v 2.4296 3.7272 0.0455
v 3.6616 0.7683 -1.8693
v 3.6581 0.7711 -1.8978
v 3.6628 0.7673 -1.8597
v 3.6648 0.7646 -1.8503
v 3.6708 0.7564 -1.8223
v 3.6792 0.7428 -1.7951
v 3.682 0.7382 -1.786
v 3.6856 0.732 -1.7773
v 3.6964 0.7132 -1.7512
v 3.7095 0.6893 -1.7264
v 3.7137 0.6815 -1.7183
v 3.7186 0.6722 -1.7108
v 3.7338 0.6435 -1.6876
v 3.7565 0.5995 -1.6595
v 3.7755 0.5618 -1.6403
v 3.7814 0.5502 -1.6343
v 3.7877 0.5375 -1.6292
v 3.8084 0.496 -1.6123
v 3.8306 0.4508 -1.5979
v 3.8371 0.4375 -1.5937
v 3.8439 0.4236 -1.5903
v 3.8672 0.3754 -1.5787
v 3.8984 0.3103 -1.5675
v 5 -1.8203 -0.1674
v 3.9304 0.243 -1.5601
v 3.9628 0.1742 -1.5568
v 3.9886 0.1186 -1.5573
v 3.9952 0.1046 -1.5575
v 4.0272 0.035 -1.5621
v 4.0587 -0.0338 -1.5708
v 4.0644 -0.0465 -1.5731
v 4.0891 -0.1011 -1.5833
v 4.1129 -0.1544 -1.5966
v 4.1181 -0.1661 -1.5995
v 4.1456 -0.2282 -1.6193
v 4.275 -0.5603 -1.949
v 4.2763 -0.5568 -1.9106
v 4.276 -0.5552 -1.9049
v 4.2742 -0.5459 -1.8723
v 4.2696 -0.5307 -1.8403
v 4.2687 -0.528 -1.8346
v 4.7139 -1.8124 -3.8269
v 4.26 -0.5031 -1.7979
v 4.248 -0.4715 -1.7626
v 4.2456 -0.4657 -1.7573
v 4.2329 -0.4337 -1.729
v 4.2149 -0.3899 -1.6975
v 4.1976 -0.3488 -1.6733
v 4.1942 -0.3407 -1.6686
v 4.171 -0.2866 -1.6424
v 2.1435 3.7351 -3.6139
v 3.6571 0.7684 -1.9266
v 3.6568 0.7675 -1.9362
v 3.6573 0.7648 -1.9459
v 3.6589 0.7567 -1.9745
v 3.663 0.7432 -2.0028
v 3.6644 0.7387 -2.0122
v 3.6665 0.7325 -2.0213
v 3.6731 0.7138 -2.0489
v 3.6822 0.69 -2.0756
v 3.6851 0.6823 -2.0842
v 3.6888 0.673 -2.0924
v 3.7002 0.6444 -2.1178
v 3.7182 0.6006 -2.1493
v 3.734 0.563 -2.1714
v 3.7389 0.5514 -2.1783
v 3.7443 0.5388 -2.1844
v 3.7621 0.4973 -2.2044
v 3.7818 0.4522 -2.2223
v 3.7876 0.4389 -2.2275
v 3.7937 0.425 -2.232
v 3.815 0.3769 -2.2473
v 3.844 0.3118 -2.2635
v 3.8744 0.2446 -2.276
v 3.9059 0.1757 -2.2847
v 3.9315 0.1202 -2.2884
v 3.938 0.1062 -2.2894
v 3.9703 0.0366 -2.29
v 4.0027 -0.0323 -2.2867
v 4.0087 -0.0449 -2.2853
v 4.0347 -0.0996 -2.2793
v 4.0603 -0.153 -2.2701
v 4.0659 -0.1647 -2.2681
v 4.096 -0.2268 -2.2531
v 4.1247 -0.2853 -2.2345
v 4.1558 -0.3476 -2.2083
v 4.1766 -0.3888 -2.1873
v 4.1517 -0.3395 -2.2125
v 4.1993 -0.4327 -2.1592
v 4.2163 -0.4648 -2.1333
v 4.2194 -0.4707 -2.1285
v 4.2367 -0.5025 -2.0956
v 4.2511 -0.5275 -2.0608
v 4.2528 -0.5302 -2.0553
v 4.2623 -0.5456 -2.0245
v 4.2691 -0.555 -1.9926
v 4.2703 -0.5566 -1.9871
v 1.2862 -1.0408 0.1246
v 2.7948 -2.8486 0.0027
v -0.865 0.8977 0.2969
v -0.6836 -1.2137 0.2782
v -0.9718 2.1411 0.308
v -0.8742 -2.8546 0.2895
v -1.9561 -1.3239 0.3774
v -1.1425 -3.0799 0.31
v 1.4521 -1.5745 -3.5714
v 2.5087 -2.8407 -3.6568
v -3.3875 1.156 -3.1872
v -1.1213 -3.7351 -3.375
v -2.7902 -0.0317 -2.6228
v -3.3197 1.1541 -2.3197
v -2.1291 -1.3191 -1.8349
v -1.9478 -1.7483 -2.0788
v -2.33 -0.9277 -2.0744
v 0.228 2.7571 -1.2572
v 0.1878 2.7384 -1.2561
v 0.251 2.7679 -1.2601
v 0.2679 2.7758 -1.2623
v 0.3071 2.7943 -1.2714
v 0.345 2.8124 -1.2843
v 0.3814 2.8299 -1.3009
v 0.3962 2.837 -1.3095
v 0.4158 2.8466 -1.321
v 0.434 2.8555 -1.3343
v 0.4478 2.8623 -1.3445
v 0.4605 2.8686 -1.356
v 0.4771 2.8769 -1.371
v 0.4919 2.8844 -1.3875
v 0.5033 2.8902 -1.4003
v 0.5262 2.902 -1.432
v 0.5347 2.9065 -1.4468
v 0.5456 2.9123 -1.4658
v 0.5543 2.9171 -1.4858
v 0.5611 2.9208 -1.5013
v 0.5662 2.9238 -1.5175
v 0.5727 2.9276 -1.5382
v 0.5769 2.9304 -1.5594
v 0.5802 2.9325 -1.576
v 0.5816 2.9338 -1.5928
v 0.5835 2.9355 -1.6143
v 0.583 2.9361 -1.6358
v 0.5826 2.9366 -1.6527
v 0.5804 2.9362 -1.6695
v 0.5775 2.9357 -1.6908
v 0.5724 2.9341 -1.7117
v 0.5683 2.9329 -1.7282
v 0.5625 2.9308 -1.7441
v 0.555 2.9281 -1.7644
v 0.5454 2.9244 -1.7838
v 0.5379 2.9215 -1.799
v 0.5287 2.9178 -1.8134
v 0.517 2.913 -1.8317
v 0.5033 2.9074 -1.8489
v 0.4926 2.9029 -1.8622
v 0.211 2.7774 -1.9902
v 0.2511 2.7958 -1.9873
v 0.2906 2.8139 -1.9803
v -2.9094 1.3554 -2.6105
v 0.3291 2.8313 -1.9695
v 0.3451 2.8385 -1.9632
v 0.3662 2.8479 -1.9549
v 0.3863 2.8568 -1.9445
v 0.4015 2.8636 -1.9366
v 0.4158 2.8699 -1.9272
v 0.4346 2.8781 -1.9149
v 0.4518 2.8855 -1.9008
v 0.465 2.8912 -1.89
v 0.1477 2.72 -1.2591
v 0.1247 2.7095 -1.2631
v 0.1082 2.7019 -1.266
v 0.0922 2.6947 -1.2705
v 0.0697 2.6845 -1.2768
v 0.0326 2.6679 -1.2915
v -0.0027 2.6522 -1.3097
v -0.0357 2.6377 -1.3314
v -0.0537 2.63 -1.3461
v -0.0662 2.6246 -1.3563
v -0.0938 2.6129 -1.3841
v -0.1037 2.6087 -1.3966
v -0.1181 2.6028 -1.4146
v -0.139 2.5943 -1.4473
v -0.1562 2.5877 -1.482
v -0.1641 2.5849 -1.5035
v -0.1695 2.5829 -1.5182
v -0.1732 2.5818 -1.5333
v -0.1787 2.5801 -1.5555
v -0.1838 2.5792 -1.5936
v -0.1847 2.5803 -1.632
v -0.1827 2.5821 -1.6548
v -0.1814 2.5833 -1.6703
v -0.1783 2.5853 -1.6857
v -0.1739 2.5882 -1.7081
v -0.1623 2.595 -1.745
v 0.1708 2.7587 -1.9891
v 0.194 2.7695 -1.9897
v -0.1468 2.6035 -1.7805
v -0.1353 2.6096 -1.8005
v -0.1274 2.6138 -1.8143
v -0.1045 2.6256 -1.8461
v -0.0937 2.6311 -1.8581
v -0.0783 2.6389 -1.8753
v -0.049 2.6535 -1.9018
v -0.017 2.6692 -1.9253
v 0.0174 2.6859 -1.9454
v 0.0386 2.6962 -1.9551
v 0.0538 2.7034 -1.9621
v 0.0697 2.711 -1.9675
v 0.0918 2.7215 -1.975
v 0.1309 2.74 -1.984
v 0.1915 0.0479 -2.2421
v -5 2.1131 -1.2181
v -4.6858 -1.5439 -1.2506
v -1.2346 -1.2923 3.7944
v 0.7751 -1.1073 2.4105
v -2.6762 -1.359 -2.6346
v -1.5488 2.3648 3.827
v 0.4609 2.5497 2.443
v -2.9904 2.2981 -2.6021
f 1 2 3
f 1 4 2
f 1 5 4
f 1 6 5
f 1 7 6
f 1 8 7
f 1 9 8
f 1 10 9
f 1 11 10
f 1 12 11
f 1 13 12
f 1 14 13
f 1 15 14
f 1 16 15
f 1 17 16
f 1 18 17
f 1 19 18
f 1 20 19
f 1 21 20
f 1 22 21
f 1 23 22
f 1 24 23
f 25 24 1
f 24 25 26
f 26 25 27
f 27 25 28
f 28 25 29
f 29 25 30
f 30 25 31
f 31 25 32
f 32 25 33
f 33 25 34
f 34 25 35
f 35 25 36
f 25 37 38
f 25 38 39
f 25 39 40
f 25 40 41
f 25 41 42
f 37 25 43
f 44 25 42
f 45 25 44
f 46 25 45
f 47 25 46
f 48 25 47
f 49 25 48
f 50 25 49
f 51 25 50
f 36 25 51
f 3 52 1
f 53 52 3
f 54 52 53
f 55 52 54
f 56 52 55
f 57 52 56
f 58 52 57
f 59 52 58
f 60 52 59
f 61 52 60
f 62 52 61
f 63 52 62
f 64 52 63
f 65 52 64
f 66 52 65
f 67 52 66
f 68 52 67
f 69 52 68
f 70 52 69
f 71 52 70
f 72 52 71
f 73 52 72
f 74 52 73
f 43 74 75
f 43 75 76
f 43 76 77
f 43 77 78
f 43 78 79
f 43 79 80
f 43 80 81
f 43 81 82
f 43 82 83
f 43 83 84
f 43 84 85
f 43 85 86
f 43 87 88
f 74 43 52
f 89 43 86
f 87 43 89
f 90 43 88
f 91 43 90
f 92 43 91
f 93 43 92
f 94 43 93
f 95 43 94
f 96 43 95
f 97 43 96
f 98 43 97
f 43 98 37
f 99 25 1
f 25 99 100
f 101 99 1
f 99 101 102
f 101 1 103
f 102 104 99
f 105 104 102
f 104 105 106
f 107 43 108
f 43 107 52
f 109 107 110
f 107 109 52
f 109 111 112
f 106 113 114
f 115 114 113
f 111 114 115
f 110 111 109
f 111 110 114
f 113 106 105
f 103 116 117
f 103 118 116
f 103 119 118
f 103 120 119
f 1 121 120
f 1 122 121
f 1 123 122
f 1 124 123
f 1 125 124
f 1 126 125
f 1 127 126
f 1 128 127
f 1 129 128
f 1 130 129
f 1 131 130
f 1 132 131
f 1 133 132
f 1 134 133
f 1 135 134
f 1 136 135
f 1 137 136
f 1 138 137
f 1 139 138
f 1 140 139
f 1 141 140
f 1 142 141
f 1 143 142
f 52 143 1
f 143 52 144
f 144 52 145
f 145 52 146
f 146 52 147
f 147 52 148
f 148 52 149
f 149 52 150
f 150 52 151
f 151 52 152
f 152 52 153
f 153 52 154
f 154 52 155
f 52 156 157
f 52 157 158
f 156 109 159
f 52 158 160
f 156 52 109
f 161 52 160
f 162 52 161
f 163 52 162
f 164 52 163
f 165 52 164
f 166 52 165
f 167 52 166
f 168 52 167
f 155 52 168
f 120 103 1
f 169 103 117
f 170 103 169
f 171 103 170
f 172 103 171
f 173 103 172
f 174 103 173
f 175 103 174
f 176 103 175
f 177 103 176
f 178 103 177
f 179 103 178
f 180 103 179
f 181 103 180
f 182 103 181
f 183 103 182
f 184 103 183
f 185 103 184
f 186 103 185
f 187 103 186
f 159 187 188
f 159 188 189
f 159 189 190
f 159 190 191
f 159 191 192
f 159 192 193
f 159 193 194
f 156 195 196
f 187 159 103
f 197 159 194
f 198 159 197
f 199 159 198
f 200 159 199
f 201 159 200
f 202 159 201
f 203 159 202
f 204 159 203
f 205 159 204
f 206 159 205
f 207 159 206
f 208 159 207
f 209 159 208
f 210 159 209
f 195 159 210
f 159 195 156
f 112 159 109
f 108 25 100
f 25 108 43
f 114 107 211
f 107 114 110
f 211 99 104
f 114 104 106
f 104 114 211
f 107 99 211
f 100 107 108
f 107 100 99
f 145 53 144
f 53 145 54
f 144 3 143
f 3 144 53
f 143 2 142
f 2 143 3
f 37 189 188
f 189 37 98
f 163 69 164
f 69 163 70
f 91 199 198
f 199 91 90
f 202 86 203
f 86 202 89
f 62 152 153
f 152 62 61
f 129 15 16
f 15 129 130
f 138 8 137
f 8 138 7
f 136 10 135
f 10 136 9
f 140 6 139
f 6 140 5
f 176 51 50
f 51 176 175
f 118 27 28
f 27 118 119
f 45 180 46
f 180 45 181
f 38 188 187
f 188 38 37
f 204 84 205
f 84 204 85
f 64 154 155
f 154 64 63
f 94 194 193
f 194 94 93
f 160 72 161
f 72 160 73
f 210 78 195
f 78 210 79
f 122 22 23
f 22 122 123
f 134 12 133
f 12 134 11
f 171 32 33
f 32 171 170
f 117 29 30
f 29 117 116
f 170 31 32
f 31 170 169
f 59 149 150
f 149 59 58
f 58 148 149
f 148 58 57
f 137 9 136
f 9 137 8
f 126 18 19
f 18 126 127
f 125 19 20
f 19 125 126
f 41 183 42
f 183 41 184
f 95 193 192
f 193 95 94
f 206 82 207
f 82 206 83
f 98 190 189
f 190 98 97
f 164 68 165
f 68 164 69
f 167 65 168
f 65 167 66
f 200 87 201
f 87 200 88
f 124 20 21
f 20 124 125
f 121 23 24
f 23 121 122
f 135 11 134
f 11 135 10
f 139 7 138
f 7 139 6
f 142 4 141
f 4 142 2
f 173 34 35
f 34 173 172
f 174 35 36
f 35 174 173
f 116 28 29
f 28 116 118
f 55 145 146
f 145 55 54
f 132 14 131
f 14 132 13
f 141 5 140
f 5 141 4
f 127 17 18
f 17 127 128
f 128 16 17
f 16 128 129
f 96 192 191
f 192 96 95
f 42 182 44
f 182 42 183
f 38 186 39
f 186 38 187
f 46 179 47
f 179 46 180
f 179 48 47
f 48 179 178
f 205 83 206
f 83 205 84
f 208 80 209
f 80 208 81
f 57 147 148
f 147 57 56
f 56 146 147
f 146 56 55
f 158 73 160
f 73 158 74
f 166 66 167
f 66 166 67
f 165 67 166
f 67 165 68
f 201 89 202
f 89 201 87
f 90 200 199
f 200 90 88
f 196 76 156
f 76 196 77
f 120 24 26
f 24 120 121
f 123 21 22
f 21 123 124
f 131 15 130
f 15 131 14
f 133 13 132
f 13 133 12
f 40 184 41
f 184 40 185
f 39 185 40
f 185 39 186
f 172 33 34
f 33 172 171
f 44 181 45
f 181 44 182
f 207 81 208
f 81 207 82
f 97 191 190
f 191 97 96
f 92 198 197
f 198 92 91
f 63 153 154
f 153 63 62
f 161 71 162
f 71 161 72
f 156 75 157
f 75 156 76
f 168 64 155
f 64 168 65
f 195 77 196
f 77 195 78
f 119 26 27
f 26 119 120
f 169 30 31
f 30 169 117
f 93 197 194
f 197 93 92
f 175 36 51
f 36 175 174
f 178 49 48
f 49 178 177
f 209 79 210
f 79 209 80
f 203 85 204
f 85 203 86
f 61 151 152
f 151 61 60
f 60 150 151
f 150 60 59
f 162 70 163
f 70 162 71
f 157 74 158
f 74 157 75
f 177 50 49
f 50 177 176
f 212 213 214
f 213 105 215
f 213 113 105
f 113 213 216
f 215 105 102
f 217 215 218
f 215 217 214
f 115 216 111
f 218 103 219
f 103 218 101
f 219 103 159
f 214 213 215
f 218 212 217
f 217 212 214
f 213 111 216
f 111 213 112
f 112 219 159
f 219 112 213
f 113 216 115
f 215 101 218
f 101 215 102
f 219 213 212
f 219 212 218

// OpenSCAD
translate([-0.817131, -4.391542, -3.400172])
rotate([2, 4, 25])
union() {
  difference() {
    difference() {
      cube(size = [6.117765, 6.117765, 3.670659], center = false);
      translate([-1.835329, -3.058882, -1.835329])
      rotate([30, 0, 15])
      cube(size = [6.117765, 6.117765, 6.117765], center = false);
    }
    translate([7.341317, 0.000000, 1.835329])
    rotate([0, 0, 30])
    rotate([-90, 0, 0])
    cylinder(h = 12.235529, r1 = 0.367066, r2 = 0.367066, center = false, $fn = 60);
  }
  translate([-2.447106, 4.282435, 1.835329])
  rotate([0, 0, -20])
  rotate([0, 30, 0])
  cube(size = [2.447106, 3.670659, 6.117765], center = false);
}
